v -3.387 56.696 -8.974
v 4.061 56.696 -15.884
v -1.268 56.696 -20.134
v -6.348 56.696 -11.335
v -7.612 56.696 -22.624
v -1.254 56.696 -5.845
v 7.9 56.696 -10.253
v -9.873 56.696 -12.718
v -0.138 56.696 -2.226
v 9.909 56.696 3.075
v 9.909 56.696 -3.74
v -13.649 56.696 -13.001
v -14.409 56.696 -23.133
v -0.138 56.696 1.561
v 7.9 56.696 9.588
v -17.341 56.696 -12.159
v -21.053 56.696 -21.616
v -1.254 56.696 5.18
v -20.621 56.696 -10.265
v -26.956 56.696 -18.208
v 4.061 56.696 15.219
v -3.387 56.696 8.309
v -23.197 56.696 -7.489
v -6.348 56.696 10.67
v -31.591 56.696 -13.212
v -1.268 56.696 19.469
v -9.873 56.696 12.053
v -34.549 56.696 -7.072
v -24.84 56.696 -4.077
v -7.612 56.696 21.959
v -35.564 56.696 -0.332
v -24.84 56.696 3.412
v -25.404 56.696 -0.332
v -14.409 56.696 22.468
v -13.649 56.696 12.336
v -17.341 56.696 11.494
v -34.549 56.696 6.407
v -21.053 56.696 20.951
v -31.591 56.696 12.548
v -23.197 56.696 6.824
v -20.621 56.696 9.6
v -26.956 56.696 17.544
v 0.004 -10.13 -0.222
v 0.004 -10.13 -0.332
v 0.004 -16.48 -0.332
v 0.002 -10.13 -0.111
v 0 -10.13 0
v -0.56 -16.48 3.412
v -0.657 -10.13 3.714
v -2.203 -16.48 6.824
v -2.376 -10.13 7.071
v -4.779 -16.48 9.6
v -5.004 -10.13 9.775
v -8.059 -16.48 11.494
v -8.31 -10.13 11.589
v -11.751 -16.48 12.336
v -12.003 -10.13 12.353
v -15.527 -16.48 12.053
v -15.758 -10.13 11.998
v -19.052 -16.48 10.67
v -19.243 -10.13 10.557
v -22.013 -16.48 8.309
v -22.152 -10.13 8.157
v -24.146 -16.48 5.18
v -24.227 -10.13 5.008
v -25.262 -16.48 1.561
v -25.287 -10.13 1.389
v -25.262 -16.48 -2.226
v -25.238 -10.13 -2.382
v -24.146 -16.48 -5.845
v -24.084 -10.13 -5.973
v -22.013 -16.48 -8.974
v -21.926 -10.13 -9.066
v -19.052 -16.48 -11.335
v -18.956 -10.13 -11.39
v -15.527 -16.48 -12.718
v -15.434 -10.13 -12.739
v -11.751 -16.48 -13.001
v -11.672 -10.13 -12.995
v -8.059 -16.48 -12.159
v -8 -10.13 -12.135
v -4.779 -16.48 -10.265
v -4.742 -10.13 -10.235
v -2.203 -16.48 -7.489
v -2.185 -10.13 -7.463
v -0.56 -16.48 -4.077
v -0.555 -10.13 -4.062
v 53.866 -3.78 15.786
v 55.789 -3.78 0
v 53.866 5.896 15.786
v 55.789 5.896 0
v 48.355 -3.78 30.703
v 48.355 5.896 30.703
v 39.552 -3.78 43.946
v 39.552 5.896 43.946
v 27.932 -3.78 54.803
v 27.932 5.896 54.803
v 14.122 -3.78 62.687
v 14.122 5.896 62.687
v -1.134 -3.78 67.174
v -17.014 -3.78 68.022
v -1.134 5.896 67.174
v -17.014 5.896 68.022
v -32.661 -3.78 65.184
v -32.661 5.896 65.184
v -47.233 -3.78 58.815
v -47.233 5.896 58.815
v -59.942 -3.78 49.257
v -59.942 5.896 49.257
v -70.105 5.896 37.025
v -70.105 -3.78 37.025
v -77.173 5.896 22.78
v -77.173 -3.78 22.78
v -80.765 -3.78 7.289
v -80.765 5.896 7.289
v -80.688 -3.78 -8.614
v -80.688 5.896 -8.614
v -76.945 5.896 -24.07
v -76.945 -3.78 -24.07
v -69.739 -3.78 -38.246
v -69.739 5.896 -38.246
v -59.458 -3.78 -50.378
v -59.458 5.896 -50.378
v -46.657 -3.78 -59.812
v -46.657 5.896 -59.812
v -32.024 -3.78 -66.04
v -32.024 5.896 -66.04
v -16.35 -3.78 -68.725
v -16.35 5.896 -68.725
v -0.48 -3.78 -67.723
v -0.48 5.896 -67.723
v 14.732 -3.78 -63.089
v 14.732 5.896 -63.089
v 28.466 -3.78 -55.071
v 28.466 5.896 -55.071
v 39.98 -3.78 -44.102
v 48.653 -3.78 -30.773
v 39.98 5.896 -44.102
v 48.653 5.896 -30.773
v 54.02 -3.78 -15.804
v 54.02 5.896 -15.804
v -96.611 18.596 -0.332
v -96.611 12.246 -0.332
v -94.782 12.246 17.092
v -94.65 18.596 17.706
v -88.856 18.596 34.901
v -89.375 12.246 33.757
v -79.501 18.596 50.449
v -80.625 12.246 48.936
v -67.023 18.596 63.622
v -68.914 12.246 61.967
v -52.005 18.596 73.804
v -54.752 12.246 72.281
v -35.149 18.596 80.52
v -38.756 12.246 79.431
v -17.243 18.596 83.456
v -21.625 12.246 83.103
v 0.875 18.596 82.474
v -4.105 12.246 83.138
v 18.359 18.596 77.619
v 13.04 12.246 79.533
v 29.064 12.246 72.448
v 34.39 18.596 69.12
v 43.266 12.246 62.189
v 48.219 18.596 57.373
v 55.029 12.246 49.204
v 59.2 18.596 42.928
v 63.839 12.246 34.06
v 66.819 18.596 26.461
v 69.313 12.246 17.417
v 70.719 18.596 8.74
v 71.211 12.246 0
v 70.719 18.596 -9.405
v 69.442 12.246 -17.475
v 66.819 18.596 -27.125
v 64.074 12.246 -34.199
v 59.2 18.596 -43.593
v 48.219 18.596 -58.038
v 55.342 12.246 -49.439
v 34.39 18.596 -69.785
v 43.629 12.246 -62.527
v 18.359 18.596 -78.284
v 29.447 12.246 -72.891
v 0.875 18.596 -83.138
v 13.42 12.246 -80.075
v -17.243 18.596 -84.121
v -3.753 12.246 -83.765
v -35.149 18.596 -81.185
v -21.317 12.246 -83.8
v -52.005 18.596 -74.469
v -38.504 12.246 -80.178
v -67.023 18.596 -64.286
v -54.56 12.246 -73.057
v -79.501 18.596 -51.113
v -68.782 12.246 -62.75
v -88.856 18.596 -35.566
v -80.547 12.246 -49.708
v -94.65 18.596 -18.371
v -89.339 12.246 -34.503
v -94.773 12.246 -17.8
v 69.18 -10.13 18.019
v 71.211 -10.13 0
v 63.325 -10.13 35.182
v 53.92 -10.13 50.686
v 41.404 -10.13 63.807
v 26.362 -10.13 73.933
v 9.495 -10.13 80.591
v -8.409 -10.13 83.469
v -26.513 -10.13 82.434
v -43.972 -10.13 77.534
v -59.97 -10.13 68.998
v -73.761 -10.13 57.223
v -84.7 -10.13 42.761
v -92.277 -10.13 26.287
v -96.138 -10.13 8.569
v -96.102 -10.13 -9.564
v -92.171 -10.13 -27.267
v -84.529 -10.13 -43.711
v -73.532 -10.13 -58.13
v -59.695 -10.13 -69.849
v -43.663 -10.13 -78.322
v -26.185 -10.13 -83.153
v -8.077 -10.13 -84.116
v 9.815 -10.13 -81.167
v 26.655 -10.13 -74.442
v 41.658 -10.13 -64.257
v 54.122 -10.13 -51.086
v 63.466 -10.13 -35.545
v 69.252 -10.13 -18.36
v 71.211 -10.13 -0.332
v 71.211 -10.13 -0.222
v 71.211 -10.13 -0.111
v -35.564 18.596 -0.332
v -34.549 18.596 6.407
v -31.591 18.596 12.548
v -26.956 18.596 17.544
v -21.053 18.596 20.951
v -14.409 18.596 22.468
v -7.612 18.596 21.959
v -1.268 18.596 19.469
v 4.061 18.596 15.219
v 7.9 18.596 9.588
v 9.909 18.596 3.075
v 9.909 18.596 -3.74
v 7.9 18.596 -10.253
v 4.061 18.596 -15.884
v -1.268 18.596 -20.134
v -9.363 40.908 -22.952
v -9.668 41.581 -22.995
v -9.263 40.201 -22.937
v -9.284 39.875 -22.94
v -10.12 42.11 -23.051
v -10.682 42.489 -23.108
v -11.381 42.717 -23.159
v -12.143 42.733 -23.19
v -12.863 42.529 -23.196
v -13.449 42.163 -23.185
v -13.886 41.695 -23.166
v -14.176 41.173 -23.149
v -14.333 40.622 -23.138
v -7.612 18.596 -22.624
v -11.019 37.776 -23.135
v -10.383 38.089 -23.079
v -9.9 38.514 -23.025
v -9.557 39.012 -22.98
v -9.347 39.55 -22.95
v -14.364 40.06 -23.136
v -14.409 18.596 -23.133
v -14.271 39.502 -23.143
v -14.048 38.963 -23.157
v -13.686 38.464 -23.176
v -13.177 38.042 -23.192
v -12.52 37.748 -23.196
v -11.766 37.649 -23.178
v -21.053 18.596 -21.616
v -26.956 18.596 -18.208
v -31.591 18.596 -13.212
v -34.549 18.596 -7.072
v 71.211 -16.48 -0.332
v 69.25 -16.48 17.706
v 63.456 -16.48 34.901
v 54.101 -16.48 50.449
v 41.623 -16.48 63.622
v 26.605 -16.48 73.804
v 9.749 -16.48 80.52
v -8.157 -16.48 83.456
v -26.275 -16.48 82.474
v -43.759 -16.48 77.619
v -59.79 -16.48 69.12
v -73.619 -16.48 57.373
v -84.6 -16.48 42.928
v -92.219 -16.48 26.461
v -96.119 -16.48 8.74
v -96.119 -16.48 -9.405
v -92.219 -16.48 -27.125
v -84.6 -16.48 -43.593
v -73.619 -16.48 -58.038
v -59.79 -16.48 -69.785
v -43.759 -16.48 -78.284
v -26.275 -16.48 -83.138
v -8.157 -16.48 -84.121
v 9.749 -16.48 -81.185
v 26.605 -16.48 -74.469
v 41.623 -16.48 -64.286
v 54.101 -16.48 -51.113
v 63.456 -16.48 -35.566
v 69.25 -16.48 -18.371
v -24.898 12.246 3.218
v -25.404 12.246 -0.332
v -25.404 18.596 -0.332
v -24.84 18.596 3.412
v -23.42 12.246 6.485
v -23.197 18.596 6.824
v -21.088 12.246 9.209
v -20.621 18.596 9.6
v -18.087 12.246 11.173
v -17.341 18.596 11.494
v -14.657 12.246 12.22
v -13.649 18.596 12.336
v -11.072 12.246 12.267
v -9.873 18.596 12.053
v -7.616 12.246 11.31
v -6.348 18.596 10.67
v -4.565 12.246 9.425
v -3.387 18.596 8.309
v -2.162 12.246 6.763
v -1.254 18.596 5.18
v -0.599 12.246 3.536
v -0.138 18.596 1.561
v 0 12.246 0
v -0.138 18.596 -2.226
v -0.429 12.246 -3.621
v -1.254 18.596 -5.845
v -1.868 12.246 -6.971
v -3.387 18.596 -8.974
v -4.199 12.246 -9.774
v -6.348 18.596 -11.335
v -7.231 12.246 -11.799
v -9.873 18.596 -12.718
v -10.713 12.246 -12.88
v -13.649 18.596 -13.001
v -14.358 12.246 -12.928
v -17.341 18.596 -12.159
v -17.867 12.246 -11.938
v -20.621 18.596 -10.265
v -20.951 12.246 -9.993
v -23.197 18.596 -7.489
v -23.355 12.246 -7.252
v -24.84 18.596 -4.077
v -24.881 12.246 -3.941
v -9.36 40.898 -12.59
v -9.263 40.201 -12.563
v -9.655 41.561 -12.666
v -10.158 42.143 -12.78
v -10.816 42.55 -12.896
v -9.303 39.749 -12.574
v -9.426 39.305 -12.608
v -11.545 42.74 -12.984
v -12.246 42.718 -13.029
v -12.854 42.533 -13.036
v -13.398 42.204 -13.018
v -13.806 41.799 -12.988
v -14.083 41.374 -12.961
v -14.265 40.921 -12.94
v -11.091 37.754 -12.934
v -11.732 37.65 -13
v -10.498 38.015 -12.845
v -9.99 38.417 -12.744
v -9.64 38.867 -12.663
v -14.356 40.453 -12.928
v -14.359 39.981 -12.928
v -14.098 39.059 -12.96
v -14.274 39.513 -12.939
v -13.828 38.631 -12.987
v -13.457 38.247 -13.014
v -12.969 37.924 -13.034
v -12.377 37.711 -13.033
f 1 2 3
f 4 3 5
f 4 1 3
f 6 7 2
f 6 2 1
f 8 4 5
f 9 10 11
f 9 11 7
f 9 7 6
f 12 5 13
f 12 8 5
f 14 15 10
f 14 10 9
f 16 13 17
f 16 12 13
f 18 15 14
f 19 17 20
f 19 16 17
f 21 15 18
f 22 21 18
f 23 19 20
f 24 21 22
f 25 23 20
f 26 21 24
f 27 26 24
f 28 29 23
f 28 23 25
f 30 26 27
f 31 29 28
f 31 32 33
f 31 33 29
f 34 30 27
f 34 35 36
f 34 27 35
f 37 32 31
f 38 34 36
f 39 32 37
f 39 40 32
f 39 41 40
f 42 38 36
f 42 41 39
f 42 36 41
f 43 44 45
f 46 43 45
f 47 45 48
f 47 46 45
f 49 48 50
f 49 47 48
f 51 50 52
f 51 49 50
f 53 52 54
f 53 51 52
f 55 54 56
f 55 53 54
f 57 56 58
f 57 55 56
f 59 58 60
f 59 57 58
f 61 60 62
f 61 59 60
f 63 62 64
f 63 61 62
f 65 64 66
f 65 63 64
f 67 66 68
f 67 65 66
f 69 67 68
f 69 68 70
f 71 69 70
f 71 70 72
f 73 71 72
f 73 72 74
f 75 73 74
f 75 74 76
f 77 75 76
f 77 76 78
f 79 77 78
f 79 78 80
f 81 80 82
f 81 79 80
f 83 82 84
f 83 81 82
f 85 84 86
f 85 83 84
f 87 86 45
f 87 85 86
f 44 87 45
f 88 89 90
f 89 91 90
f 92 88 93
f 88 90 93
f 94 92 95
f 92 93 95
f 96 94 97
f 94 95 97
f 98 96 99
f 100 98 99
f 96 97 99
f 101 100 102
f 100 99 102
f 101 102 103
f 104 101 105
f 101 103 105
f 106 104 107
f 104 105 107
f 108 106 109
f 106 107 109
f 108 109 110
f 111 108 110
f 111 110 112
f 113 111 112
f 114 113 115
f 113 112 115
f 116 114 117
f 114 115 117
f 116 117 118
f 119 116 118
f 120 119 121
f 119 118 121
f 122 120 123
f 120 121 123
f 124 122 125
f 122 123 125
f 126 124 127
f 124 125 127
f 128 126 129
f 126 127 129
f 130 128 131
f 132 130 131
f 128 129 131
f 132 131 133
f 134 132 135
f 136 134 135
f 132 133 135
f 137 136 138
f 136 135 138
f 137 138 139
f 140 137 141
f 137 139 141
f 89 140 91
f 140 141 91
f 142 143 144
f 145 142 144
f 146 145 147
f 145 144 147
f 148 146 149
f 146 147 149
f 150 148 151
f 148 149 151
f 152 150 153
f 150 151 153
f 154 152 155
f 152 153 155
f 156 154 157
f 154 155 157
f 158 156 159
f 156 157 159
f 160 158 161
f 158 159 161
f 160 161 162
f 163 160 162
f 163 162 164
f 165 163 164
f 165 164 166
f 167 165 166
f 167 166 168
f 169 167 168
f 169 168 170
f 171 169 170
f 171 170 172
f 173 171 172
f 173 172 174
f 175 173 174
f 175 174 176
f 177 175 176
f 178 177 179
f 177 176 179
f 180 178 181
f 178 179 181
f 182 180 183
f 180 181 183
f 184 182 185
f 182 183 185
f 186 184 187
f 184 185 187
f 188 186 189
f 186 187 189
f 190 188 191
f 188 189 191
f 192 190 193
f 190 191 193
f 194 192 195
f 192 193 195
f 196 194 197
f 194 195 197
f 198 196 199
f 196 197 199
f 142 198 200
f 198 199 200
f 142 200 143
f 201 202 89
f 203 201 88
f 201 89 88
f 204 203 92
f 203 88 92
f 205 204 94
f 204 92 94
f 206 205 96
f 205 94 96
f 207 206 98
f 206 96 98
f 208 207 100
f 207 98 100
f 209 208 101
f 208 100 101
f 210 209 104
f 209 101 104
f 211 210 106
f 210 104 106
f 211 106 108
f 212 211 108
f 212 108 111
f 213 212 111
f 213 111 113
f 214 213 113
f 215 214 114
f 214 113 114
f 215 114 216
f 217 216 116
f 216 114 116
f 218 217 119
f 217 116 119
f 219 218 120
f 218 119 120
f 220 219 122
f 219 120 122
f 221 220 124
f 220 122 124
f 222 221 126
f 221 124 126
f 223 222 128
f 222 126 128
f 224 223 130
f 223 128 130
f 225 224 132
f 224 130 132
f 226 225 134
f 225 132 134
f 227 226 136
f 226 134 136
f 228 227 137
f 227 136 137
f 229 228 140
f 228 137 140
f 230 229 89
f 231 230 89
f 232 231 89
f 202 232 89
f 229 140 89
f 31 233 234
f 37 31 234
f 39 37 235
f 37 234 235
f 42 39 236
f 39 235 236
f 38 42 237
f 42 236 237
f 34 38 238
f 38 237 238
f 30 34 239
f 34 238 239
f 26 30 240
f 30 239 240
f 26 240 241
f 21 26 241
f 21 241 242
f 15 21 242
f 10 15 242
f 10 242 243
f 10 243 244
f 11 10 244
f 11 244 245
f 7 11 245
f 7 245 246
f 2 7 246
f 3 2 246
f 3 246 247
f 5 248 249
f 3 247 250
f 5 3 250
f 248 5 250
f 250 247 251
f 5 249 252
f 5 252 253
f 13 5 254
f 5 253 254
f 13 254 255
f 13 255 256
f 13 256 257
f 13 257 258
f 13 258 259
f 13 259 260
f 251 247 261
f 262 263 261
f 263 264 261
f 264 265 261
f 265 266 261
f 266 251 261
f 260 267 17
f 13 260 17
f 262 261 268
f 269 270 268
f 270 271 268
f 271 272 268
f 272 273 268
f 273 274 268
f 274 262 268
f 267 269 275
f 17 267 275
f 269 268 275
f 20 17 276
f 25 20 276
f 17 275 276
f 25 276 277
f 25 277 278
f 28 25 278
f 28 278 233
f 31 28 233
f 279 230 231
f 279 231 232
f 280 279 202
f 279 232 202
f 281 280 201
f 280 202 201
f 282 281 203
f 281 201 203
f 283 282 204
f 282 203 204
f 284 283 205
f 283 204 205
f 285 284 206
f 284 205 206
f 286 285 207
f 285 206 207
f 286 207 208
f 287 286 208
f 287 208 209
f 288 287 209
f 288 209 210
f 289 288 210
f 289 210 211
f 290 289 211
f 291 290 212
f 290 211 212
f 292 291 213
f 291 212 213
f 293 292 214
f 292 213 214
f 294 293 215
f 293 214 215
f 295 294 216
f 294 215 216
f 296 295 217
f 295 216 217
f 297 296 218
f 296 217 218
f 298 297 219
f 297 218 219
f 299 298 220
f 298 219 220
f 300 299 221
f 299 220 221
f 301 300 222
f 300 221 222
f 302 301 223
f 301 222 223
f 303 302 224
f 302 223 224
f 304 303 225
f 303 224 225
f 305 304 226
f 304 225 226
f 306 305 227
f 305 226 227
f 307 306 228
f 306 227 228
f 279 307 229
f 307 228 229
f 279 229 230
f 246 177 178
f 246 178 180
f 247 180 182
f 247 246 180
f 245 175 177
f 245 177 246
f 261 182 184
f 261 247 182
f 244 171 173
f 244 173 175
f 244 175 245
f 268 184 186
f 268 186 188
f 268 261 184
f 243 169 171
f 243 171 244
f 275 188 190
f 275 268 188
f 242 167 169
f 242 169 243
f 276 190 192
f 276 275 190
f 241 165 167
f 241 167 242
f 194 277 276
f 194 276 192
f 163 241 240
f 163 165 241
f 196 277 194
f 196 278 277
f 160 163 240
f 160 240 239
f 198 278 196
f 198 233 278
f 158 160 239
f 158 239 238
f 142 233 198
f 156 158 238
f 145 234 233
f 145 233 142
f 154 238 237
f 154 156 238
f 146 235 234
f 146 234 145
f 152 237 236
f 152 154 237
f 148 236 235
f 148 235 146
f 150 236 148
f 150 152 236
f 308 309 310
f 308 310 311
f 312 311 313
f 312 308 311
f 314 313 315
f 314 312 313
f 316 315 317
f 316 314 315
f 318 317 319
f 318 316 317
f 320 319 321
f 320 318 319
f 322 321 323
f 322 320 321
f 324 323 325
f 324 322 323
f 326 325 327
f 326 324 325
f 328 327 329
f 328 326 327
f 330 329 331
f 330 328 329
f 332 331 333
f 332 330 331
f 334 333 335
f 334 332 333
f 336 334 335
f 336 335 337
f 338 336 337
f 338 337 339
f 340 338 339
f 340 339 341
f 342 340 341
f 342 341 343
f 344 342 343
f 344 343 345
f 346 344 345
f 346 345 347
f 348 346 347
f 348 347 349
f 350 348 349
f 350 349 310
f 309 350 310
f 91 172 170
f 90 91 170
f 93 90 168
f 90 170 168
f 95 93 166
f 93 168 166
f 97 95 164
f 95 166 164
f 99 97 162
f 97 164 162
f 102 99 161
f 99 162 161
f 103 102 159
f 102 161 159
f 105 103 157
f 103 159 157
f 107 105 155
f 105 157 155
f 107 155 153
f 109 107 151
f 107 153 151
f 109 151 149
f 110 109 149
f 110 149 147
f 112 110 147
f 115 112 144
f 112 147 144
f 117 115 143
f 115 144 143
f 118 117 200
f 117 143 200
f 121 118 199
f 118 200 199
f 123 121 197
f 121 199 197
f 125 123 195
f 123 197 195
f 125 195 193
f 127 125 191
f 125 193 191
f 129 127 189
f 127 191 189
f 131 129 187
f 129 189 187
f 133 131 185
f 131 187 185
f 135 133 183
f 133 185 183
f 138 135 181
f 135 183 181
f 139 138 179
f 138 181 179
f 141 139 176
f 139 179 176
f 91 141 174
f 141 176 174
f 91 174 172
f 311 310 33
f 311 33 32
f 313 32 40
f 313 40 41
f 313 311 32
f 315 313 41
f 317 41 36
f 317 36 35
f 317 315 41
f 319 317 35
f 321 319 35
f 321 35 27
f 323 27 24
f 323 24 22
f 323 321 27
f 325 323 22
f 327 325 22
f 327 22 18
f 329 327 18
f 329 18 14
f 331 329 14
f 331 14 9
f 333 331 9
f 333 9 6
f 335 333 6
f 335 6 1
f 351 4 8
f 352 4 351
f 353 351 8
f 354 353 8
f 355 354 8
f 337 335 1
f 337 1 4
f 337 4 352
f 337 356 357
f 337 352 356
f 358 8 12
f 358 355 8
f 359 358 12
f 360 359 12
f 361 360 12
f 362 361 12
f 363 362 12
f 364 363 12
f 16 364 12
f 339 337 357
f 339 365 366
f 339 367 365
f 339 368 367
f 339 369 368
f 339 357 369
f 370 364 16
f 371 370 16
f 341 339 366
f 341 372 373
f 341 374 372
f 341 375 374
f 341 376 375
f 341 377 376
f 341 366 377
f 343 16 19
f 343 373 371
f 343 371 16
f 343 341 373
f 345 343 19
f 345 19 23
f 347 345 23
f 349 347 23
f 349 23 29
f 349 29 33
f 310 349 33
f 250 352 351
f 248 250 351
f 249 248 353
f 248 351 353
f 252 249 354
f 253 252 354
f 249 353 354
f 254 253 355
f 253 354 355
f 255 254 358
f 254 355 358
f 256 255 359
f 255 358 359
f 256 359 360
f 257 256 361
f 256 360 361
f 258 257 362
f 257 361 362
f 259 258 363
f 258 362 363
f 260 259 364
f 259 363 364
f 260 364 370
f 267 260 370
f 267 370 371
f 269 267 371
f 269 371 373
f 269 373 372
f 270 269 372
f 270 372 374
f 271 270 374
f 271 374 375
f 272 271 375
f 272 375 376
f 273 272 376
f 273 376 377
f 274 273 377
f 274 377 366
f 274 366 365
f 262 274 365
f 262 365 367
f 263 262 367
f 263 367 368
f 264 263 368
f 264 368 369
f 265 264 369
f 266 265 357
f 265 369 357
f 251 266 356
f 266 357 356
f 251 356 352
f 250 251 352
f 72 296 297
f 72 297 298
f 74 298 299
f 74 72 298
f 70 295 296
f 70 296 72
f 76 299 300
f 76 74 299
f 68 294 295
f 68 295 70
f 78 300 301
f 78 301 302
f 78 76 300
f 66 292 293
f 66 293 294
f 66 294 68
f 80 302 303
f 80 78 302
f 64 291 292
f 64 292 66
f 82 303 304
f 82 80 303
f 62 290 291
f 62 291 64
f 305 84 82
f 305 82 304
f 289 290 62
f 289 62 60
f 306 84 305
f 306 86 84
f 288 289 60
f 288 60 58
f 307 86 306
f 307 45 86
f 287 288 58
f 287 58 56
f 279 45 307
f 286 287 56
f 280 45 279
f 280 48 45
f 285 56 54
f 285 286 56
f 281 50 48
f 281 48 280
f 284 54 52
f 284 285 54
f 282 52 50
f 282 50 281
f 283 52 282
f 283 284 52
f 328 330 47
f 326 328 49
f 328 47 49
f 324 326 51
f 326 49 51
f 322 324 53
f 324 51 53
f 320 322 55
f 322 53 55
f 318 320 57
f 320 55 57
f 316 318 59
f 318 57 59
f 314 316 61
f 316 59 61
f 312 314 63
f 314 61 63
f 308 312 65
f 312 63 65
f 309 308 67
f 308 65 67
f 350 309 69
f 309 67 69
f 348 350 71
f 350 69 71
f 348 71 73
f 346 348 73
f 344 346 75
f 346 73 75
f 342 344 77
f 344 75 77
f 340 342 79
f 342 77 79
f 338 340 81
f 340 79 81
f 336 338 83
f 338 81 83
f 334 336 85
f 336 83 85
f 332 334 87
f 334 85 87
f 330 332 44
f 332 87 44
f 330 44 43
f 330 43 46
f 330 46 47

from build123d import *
from build123d import SkipClean  # not in build123d's __all__

# Parameters (mm, degrees)
F2_FACE_R    = 83.9113721036
F2_FACE_R_2  = 12.7043497663
F3_DEPTH     = 6.35
F2_FACE1_R   = 83.9113721036
F2_FACE1_R_2 = 12.7043497663
F4_DEPTH     = 6.35
F5_R         = 22.8643497663
F5_R_2       = 12.7043497663
F6_DEPTH     = 38.1
F8_D         = 5.1054
F8_DEPTH     = 84.2447919947


# Not quite as in the source:
# - after a boolean that leaves OpenCascade's solid faulty, fix() repairs it


with BuildPart() as f2:
    # F0 (on Top) → F2 (revolve)
    with BuildSketch(Plane.XY):
        Polygon((71.2107136504, 12.2464282371), (0, 12.2464282371), (0, -10.1297611803), (71.2107136504, -10.1297611803), (55.7892807321, -3.7797611803), (55.7892807321, 5.8964282371), align=None)
    revolve(axis=Axis((-12.7, 0, -0.3324198911), (0, -1, 0)))

    # F2_face (on face) → F3 (join)
    with BuildSketch(Plane(origin=(-12.7, 12.2464282371, -0.3324198911), x_dir=(-1, 0, 0), z_dir=(0, 1, 0))):
        Circle(F2_FACE_R)
        Circle(F2_FACE_R_2, mode=Mode.SUBTRACT)
    with SkipClean():  # cleaning this boolean's faces spoils the solid; the shape is the same uncleaned
        extrude(amount=F3_DEPTH)

    # F2_face1 (on face) → F4 (join)
    with BuildSketch(Plane(origin=(-12.7, -10.1297611803, -0.3324198911), x_dir=(1, 0, 0), z_dir=(0, -1, 0))):
        Circle(F2_FACE1_R)
        Circle(F2_FACE1_R_2, mode=Mode.SUBTRACT)
    extrude(amount=F4_DEPTH)

    add(f2.part.fix(), mode=Mode.REPLACE)

    # F5 (on face) → F6 (join)
    with BuildSketch(Plane(origin=(0, 18.5964282371, 0), x_dir=(-1, 0, 0), z_dir=(0, 1, 0))):
        with Locations((12.7, -0.3324198911)):
            Circle(F5_R)
        with Locations((12.7, -0.3324198911)):
            Circle(F5_R_2, mode=Mode.SUBTRACT)
    extrude(amount=F6_DEPTH)

    # F8 (through all, one way)
    with BuildSketch(Plane.XY):
        with Locations((-11.8156038225, 40.2014479041)):
            Circle(F8_D / 2)
    extrude(amount=-F8_DEPTH, mode=Mode.SUBTRACT)


solid = f2.part
